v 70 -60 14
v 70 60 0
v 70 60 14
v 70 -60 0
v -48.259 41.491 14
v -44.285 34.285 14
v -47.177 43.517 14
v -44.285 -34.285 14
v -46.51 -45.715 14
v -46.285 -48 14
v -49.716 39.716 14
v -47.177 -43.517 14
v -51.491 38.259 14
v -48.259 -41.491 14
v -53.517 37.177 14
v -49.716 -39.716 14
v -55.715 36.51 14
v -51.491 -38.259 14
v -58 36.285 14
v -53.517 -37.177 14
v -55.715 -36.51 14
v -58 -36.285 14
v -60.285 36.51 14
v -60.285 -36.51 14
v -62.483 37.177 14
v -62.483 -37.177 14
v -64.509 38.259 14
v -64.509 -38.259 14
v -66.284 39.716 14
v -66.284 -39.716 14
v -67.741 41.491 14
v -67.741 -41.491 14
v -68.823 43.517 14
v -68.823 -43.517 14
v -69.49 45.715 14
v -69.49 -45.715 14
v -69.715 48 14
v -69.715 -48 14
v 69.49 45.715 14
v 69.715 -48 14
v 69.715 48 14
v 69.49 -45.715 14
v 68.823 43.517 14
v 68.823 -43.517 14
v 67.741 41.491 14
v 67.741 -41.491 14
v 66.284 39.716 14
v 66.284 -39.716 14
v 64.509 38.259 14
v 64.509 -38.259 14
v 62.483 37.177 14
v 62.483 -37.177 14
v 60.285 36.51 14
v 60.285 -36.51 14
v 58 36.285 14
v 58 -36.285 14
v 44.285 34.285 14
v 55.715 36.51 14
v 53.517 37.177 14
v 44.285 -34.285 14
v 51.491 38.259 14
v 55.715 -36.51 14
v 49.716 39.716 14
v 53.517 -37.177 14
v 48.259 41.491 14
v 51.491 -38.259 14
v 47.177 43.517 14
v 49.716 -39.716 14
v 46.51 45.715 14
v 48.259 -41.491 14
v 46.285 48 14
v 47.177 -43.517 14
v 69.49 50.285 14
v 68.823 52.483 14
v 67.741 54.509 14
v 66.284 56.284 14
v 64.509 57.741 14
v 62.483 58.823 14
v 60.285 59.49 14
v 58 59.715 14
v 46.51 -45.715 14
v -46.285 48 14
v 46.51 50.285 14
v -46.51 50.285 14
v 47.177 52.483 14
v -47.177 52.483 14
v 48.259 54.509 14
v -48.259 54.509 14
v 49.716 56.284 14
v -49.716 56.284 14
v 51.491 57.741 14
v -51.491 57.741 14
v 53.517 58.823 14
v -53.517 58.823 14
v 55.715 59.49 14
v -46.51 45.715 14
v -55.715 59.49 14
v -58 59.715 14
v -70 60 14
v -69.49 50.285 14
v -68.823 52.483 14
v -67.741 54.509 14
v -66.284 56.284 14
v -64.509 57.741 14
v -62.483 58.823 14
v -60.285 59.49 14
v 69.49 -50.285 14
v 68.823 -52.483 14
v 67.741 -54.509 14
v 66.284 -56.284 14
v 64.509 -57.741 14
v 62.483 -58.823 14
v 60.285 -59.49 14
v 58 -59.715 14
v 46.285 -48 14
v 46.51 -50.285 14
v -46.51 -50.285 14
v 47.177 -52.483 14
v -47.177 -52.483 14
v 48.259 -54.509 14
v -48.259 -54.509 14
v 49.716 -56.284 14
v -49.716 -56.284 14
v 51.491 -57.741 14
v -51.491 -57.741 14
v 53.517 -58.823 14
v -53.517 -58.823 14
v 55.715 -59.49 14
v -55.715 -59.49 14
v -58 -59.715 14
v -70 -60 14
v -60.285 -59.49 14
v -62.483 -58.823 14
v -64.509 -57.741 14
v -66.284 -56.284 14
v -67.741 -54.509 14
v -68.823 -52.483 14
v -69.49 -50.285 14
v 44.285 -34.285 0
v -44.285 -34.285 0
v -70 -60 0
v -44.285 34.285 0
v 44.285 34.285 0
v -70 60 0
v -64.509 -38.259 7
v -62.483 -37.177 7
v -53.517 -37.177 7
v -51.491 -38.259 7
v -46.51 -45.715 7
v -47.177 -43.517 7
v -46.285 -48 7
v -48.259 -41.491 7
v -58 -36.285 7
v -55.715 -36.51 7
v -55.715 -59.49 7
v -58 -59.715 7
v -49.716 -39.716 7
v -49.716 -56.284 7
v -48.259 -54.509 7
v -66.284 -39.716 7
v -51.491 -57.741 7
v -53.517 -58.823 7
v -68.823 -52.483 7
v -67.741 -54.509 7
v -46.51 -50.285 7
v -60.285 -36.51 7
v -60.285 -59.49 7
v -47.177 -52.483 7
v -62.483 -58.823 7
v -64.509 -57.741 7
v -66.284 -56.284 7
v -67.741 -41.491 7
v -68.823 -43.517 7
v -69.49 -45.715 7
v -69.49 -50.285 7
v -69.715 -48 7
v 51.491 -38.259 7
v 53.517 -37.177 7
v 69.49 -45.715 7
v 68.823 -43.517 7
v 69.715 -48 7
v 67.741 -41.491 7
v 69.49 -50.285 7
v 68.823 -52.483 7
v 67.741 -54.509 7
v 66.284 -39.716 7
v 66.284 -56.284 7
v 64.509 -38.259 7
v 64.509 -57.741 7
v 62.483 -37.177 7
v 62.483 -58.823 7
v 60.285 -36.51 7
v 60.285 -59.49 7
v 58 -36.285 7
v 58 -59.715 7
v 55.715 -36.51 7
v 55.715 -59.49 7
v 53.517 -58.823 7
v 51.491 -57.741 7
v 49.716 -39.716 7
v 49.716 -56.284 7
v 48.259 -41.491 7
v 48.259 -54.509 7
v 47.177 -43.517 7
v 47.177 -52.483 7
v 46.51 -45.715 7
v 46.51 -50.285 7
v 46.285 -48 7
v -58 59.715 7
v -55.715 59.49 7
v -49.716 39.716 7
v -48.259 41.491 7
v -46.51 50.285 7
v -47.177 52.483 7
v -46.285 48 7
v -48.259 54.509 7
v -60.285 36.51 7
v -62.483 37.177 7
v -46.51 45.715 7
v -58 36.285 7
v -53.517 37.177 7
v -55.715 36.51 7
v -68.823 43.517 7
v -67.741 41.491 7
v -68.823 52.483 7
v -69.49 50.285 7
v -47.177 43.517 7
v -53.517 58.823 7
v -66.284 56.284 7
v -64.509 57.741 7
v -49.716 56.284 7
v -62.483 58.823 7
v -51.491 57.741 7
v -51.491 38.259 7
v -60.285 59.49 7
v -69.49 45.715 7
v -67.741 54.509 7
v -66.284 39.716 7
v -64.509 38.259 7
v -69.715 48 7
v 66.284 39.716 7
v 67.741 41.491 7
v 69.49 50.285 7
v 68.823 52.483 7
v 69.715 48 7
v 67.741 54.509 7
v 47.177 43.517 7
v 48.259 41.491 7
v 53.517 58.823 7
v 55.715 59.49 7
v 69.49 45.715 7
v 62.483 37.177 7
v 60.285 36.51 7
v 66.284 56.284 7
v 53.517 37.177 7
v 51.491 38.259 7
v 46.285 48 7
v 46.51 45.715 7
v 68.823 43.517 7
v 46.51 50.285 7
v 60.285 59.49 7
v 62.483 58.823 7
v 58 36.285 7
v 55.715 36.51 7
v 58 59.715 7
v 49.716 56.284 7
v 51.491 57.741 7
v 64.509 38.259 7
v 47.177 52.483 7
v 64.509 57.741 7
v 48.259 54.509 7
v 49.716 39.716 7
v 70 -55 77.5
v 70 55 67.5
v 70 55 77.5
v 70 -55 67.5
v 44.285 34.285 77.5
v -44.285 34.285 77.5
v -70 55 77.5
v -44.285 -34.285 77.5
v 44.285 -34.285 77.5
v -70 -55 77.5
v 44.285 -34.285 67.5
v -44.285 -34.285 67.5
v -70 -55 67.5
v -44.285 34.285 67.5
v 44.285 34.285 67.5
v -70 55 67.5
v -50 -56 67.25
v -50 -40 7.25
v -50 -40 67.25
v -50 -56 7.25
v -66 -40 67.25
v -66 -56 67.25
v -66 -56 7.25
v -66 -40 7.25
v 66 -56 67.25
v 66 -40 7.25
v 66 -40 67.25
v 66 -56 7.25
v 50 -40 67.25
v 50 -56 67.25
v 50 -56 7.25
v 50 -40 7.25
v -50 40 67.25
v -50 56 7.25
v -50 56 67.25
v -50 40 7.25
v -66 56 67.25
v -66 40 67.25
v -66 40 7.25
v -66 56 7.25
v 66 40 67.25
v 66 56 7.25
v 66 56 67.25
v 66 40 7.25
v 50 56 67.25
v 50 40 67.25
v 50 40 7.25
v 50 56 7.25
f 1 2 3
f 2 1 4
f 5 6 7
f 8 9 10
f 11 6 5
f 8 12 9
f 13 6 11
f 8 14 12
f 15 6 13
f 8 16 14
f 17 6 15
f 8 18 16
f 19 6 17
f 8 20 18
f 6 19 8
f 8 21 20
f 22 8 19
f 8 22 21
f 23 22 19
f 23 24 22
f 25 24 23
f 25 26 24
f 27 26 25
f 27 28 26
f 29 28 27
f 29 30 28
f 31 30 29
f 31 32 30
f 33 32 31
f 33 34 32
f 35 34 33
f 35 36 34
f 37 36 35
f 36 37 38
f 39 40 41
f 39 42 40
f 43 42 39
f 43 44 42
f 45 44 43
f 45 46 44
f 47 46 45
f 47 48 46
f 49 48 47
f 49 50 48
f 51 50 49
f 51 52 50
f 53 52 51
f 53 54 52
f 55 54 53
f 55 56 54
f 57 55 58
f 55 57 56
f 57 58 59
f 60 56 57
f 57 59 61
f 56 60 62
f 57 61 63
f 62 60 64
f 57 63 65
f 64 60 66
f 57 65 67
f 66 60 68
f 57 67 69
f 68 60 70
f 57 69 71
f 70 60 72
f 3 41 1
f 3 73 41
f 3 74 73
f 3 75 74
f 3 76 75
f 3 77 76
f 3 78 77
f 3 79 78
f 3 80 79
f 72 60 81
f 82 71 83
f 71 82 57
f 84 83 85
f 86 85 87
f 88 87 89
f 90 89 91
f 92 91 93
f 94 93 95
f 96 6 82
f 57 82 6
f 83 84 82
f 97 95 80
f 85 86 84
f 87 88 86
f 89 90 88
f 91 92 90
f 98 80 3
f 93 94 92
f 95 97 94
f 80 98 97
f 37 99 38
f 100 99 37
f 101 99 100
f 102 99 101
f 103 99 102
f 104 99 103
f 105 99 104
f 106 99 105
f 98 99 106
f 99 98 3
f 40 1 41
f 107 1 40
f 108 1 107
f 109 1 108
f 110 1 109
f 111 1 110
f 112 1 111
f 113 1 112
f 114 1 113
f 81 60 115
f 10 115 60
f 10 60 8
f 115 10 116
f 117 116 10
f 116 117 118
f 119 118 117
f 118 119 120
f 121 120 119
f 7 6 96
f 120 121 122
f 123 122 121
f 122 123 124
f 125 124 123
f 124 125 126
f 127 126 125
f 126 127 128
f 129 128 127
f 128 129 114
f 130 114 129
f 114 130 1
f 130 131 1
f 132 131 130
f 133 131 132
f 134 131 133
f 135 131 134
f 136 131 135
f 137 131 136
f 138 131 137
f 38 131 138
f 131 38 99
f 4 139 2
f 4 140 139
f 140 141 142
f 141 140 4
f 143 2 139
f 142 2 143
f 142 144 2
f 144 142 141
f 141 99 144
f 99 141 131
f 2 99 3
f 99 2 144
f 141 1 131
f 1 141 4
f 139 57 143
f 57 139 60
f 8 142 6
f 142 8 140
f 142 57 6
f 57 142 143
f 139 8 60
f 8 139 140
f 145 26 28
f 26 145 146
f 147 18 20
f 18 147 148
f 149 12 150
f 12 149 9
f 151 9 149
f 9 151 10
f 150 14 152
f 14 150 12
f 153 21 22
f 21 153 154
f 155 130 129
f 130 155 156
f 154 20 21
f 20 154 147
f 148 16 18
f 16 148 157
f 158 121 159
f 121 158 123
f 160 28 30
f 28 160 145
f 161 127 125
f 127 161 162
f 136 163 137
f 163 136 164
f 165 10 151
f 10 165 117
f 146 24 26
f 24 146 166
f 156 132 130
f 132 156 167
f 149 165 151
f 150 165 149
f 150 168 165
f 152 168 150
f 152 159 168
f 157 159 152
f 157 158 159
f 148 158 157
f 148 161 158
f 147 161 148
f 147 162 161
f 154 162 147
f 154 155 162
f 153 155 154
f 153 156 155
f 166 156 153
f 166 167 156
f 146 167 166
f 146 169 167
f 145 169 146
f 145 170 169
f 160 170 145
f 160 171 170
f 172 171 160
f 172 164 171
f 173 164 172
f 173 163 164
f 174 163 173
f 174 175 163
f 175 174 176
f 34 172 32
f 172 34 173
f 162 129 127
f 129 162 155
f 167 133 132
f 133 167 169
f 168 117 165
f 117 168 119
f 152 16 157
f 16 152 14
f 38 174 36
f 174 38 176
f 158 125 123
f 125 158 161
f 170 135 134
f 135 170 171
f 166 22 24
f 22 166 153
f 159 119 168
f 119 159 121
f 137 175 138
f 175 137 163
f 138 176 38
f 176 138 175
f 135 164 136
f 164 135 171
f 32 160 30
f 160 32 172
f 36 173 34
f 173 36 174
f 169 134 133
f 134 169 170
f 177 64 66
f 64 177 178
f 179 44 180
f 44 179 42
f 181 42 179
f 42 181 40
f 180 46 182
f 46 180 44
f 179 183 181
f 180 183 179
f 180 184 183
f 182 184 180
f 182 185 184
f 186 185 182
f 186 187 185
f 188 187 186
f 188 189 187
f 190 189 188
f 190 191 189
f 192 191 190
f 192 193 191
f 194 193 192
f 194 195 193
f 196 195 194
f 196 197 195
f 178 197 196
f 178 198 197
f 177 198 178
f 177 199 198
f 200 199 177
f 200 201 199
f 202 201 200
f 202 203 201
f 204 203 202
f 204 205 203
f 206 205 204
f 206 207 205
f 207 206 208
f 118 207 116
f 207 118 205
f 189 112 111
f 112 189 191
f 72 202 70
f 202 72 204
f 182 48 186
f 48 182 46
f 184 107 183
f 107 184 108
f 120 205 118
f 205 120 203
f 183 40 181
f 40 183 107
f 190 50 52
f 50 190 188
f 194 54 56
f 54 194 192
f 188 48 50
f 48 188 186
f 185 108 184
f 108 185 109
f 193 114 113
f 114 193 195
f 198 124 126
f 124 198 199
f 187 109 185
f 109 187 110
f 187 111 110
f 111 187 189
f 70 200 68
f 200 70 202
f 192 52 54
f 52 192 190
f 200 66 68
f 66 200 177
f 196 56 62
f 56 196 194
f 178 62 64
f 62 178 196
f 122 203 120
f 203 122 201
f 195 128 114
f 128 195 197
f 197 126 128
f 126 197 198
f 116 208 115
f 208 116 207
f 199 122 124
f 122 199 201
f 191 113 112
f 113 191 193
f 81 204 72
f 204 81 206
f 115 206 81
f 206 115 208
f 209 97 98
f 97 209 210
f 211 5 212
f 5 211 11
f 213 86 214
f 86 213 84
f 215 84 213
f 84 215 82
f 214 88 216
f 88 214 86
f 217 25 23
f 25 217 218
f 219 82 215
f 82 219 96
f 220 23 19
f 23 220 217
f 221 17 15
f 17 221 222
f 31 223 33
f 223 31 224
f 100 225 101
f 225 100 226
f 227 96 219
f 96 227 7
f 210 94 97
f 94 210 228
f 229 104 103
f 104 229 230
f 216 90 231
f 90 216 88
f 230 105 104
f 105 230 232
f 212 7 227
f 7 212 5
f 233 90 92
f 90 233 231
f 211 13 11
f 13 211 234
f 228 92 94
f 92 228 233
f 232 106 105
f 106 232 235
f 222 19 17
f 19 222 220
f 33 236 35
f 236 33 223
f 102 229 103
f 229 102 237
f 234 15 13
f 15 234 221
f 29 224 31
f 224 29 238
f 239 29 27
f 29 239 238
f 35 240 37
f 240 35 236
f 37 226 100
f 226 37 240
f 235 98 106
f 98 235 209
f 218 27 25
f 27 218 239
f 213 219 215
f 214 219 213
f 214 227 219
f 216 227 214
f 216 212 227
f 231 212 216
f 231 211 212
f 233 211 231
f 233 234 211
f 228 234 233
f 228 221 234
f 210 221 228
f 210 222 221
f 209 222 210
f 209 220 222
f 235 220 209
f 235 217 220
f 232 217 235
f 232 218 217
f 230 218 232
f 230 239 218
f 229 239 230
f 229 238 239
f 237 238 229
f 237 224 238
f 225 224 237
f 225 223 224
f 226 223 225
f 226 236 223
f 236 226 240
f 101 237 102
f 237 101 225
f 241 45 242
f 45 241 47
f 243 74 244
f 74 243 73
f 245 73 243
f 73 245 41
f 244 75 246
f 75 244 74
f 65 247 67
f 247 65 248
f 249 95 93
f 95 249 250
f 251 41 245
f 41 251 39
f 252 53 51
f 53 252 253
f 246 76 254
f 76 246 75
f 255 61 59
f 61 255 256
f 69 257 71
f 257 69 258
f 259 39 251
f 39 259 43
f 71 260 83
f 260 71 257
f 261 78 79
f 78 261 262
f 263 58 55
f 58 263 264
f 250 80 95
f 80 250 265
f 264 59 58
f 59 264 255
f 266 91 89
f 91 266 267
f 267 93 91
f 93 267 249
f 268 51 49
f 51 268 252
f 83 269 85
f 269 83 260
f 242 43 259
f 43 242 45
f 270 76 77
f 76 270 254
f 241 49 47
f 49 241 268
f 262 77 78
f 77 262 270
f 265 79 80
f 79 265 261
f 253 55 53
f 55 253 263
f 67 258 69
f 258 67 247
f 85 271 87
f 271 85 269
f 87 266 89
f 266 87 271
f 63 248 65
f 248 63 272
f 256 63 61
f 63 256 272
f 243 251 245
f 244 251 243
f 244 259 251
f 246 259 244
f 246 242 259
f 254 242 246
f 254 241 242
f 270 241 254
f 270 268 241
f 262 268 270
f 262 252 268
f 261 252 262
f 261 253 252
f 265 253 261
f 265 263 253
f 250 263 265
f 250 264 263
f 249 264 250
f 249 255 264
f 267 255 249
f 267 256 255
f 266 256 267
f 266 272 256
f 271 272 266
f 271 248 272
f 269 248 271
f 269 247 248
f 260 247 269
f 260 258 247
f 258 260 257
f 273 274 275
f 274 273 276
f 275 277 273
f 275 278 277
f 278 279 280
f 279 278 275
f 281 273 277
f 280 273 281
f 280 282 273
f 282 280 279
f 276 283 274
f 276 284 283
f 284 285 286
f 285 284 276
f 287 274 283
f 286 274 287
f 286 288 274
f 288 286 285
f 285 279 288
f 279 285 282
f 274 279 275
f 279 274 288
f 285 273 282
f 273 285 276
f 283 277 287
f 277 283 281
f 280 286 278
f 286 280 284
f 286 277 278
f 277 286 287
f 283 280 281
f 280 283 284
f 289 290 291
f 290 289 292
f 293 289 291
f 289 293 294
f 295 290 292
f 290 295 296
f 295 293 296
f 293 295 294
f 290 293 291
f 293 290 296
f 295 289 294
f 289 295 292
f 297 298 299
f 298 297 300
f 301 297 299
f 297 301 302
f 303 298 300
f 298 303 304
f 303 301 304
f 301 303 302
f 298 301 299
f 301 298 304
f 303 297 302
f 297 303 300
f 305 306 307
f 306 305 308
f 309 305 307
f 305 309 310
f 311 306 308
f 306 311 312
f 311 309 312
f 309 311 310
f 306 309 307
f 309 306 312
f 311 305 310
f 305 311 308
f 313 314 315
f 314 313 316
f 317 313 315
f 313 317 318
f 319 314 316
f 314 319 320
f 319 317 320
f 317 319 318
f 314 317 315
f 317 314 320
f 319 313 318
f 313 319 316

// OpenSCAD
$fn = 32;

// ------------------------------------------------------------------------
// Frame cube: base 140 x 120 mm, posts 60 mm tall
// Every part is its own module, assembly() places every instance.
// ------------------------------------------------------------------------

// --- part 1 ---
module base_frame() {
  difference() {
    translate([-70, -60, 0]) cube([140, 120, 14]);
    translate([-44.285, -34.285, -1]) cube([88.57, 68.57, 16]);
    translate([-58, -48, 7]) cylinder(h = 8, d = 23.43);
    translate([58, -48, 7]) cylinder(h = 8, d = 23.43);
    translate([-58, 48, 7]) cylinder(h = 8, d = 23.43);
    translate([58, 48, 7]) cylinder(h = 8, d = 23.43);
  }
}

// --- part 2 ---
module corner_post() {
  translate([-8, -8, 0]) cube([16, 16, 60]);
}

// --- part 3 ---
module top_frame() {
  difference() {
    translate([-70, -55, 0]) cube([140, 110, 10]);
    translate([-44.285, -34.285, -1]) cube([88.57, 68.57, 12]);
  }
}

// --- assembly ---
module assembly() {
  color([0.80, 0.24, 0.20]) translate([0, 0, 0]) rotate([0, 0, 0]) base_frame();
  color([0.20, 0.45, 0.75]) translate([-58, -48, 7.25]) rotate([0, 0, 0]) corner_post();
  color([0.25, 0.62, 0.32]) translate([58, -48, 7.25]) rotate([0, 0, 0]) corner_post();
  color([0.92, 0.70, 0.18]) translate([-58, 48, 7.25]) rotate([0, 0, 0]) corner_post();
  color([0.58, 0.35, 0.70]) translate([58, 48, 7.25]) rotate([0, 0, 0]) corner_post();
  color([0.16, 0.66, 0.66]) translate([0, 0, 67.5]) rotate([0, 0, 0]) top_frame();
}

assembly();
